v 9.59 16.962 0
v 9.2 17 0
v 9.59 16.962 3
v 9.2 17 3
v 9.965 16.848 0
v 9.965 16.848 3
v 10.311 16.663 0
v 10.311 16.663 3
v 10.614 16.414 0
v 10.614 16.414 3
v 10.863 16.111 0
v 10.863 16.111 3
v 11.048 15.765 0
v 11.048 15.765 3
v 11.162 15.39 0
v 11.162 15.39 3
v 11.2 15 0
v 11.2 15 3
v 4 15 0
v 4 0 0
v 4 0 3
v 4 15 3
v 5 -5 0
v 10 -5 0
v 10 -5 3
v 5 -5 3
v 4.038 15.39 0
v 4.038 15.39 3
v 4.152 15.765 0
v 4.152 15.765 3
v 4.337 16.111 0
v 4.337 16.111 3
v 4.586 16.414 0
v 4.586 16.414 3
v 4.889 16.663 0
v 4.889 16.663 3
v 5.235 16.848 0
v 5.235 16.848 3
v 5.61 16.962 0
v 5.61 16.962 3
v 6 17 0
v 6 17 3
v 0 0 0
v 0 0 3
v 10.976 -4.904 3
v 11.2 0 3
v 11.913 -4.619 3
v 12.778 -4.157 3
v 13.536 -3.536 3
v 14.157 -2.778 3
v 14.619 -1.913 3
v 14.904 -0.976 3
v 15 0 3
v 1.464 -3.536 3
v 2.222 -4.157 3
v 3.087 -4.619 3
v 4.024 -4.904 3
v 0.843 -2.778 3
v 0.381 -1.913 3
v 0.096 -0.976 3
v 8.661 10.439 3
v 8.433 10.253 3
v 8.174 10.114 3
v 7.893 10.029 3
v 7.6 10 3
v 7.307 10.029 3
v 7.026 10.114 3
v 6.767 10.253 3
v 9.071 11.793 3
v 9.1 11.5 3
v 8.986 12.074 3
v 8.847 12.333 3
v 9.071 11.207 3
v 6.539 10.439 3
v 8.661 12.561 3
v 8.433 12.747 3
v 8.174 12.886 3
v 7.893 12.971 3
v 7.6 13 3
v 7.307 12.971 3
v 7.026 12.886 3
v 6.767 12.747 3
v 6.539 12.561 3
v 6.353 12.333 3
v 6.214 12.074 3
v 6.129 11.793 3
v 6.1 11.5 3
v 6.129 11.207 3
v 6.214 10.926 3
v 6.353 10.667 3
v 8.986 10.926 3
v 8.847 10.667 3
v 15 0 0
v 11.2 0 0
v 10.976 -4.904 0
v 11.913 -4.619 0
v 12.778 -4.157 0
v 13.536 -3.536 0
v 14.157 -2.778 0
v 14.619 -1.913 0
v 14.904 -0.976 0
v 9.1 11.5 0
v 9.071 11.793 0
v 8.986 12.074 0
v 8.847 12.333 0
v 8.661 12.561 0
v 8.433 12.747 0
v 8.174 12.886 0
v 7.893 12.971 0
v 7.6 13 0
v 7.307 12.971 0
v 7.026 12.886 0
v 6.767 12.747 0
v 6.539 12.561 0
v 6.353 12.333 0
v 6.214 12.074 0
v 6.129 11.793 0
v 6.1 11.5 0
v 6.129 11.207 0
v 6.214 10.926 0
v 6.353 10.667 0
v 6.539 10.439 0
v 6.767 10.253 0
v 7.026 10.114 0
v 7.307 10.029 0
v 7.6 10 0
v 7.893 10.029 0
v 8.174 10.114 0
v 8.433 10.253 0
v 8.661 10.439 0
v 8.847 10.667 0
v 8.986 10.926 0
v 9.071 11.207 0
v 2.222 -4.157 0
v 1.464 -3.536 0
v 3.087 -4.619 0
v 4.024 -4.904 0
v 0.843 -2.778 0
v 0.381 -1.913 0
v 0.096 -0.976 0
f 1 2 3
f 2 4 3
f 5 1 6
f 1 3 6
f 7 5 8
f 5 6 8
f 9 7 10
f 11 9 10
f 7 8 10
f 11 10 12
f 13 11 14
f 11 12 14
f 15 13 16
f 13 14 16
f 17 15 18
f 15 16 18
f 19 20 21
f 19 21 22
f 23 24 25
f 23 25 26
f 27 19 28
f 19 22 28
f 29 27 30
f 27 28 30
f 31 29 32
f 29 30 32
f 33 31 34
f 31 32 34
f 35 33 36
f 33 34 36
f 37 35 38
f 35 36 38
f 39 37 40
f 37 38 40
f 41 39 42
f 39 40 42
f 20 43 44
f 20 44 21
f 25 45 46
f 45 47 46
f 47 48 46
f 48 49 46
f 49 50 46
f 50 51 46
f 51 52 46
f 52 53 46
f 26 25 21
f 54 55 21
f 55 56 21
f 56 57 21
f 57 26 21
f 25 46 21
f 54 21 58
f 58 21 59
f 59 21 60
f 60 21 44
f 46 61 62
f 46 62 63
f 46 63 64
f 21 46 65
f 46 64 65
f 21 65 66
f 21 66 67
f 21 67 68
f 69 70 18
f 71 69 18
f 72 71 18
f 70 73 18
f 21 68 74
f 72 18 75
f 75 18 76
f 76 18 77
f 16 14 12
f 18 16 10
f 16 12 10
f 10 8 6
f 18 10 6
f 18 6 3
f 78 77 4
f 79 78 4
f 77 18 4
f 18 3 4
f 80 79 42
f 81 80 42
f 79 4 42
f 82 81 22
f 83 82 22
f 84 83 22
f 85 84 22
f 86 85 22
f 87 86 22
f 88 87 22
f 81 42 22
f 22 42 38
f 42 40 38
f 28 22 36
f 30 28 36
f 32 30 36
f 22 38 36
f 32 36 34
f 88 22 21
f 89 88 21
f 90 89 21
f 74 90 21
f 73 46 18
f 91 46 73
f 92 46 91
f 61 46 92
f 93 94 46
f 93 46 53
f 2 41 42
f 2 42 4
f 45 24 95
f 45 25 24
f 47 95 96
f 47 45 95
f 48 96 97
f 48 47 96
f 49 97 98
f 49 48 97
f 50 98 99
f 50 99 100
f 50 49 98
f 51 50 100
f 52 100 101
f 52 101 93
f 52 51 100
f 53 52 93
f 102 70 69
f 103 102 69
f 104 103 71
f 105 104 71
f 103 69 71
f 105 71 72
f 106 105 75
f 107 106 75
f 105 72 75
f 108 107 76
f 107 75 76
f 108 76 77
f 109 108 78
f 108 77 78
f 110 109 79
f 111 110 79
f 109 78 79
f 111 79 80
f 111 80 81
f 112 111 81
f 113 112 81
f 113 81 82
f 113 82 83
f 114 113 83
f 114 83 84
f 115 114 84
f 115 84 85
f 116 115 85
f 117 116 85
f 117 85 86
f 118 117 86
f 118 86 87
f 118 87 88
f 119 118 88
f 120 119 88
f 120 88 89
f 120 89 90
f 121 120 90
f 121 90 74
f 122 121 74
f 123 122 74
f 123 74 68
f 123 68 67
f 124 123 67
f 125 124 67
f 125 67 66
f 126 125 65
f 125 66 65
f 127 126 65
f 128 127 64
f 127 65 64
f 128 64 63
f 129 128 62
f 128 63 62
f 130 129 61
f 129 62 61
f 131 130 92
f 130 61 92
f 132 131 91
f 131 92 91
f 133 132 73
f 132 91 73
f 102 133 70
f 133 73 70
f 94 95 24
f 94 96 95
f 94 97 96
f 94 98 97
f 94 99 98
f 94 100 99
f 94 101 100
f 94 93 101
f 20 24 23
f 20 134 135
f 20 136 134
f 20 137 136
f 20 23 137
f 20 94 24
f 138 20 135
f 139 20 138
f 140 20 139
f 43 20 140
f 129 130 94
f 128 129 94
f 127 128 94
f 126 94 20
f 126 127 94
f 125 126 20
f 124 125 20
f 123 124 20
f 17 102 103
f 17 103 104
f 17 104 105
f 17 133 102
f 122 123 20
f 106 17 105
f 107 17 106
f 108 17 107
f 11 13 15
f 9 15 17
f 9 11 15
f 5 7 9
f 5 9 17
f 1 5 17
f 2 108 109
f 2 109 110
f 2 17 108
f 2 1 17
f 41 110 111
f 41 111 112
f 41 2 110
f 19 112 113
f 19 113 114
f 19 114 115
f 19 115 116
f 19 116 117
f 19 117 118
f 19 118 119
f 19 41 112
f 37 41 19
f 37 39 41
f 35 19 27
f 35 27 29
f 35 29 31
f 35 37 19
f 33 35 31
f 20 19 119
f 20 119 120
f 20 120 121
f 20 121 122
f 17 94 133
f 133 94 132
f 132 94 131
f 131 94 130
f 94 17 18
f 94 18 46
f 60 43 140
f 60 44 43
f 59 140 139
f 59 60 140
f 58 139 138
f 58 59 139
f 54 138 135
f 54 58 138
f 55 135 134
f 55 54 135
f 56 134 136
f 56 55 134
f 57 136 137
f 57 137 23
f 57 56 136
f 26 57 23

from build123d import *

# Parameters (mm, degrees)
RESSALTO_EXTRUS_O1_DEPTH = 3
ESBO_O2_R                = 1.5
CORTE_EXTRUS_O1_DEPTH    = 23.869193252
FILETE1_R                = 5
FILETE2_R                = 2


with BuildPart() as part:
    # Esboço1 → Ressalto-extrusão1 (new body)
    with BuildSketch(Plane.XY):
        Polygon((0, 0), (4, 0), (4, 17), (11.2, 17), (11.2, 0), (15, 0), (15, -5), (0, -5), align=None)
    extrude(amount=RESSALTO_EXTRUS_O1_DEPTH)

    # Esboço2 → Corte-extrusão1 (cut, through all)
    with BuildSketch(Plane.XY.offset(3)):
        with Locations((7.6, 11.5)):
            Circle(ESBO_O2_R)
    extrude(amount=-CORTE_EXTRUS_O1_DEPTH, mode=Mode.SUBTRACT)

    # Filete1
    filete1_edges = [part.edges().sort_by_distance(p)[0] for p in [
        (0, -5, 1.5),
        (15, -5, 1.5),
    ]]
    fillet(filete1_edges, radius=FILETE1_R - 0.0001)  # a hair under: the kernel refuses the full size

    # Filete2
    filete2_edges = [part.edges().sort_by_distance(p)[0] for p in [
        (4, 17, 1.5),
        (11.2, 17, 1.5),
    ]]
    fillet(filete2_edges, radius=FILETE2_R)


solid = part.part
